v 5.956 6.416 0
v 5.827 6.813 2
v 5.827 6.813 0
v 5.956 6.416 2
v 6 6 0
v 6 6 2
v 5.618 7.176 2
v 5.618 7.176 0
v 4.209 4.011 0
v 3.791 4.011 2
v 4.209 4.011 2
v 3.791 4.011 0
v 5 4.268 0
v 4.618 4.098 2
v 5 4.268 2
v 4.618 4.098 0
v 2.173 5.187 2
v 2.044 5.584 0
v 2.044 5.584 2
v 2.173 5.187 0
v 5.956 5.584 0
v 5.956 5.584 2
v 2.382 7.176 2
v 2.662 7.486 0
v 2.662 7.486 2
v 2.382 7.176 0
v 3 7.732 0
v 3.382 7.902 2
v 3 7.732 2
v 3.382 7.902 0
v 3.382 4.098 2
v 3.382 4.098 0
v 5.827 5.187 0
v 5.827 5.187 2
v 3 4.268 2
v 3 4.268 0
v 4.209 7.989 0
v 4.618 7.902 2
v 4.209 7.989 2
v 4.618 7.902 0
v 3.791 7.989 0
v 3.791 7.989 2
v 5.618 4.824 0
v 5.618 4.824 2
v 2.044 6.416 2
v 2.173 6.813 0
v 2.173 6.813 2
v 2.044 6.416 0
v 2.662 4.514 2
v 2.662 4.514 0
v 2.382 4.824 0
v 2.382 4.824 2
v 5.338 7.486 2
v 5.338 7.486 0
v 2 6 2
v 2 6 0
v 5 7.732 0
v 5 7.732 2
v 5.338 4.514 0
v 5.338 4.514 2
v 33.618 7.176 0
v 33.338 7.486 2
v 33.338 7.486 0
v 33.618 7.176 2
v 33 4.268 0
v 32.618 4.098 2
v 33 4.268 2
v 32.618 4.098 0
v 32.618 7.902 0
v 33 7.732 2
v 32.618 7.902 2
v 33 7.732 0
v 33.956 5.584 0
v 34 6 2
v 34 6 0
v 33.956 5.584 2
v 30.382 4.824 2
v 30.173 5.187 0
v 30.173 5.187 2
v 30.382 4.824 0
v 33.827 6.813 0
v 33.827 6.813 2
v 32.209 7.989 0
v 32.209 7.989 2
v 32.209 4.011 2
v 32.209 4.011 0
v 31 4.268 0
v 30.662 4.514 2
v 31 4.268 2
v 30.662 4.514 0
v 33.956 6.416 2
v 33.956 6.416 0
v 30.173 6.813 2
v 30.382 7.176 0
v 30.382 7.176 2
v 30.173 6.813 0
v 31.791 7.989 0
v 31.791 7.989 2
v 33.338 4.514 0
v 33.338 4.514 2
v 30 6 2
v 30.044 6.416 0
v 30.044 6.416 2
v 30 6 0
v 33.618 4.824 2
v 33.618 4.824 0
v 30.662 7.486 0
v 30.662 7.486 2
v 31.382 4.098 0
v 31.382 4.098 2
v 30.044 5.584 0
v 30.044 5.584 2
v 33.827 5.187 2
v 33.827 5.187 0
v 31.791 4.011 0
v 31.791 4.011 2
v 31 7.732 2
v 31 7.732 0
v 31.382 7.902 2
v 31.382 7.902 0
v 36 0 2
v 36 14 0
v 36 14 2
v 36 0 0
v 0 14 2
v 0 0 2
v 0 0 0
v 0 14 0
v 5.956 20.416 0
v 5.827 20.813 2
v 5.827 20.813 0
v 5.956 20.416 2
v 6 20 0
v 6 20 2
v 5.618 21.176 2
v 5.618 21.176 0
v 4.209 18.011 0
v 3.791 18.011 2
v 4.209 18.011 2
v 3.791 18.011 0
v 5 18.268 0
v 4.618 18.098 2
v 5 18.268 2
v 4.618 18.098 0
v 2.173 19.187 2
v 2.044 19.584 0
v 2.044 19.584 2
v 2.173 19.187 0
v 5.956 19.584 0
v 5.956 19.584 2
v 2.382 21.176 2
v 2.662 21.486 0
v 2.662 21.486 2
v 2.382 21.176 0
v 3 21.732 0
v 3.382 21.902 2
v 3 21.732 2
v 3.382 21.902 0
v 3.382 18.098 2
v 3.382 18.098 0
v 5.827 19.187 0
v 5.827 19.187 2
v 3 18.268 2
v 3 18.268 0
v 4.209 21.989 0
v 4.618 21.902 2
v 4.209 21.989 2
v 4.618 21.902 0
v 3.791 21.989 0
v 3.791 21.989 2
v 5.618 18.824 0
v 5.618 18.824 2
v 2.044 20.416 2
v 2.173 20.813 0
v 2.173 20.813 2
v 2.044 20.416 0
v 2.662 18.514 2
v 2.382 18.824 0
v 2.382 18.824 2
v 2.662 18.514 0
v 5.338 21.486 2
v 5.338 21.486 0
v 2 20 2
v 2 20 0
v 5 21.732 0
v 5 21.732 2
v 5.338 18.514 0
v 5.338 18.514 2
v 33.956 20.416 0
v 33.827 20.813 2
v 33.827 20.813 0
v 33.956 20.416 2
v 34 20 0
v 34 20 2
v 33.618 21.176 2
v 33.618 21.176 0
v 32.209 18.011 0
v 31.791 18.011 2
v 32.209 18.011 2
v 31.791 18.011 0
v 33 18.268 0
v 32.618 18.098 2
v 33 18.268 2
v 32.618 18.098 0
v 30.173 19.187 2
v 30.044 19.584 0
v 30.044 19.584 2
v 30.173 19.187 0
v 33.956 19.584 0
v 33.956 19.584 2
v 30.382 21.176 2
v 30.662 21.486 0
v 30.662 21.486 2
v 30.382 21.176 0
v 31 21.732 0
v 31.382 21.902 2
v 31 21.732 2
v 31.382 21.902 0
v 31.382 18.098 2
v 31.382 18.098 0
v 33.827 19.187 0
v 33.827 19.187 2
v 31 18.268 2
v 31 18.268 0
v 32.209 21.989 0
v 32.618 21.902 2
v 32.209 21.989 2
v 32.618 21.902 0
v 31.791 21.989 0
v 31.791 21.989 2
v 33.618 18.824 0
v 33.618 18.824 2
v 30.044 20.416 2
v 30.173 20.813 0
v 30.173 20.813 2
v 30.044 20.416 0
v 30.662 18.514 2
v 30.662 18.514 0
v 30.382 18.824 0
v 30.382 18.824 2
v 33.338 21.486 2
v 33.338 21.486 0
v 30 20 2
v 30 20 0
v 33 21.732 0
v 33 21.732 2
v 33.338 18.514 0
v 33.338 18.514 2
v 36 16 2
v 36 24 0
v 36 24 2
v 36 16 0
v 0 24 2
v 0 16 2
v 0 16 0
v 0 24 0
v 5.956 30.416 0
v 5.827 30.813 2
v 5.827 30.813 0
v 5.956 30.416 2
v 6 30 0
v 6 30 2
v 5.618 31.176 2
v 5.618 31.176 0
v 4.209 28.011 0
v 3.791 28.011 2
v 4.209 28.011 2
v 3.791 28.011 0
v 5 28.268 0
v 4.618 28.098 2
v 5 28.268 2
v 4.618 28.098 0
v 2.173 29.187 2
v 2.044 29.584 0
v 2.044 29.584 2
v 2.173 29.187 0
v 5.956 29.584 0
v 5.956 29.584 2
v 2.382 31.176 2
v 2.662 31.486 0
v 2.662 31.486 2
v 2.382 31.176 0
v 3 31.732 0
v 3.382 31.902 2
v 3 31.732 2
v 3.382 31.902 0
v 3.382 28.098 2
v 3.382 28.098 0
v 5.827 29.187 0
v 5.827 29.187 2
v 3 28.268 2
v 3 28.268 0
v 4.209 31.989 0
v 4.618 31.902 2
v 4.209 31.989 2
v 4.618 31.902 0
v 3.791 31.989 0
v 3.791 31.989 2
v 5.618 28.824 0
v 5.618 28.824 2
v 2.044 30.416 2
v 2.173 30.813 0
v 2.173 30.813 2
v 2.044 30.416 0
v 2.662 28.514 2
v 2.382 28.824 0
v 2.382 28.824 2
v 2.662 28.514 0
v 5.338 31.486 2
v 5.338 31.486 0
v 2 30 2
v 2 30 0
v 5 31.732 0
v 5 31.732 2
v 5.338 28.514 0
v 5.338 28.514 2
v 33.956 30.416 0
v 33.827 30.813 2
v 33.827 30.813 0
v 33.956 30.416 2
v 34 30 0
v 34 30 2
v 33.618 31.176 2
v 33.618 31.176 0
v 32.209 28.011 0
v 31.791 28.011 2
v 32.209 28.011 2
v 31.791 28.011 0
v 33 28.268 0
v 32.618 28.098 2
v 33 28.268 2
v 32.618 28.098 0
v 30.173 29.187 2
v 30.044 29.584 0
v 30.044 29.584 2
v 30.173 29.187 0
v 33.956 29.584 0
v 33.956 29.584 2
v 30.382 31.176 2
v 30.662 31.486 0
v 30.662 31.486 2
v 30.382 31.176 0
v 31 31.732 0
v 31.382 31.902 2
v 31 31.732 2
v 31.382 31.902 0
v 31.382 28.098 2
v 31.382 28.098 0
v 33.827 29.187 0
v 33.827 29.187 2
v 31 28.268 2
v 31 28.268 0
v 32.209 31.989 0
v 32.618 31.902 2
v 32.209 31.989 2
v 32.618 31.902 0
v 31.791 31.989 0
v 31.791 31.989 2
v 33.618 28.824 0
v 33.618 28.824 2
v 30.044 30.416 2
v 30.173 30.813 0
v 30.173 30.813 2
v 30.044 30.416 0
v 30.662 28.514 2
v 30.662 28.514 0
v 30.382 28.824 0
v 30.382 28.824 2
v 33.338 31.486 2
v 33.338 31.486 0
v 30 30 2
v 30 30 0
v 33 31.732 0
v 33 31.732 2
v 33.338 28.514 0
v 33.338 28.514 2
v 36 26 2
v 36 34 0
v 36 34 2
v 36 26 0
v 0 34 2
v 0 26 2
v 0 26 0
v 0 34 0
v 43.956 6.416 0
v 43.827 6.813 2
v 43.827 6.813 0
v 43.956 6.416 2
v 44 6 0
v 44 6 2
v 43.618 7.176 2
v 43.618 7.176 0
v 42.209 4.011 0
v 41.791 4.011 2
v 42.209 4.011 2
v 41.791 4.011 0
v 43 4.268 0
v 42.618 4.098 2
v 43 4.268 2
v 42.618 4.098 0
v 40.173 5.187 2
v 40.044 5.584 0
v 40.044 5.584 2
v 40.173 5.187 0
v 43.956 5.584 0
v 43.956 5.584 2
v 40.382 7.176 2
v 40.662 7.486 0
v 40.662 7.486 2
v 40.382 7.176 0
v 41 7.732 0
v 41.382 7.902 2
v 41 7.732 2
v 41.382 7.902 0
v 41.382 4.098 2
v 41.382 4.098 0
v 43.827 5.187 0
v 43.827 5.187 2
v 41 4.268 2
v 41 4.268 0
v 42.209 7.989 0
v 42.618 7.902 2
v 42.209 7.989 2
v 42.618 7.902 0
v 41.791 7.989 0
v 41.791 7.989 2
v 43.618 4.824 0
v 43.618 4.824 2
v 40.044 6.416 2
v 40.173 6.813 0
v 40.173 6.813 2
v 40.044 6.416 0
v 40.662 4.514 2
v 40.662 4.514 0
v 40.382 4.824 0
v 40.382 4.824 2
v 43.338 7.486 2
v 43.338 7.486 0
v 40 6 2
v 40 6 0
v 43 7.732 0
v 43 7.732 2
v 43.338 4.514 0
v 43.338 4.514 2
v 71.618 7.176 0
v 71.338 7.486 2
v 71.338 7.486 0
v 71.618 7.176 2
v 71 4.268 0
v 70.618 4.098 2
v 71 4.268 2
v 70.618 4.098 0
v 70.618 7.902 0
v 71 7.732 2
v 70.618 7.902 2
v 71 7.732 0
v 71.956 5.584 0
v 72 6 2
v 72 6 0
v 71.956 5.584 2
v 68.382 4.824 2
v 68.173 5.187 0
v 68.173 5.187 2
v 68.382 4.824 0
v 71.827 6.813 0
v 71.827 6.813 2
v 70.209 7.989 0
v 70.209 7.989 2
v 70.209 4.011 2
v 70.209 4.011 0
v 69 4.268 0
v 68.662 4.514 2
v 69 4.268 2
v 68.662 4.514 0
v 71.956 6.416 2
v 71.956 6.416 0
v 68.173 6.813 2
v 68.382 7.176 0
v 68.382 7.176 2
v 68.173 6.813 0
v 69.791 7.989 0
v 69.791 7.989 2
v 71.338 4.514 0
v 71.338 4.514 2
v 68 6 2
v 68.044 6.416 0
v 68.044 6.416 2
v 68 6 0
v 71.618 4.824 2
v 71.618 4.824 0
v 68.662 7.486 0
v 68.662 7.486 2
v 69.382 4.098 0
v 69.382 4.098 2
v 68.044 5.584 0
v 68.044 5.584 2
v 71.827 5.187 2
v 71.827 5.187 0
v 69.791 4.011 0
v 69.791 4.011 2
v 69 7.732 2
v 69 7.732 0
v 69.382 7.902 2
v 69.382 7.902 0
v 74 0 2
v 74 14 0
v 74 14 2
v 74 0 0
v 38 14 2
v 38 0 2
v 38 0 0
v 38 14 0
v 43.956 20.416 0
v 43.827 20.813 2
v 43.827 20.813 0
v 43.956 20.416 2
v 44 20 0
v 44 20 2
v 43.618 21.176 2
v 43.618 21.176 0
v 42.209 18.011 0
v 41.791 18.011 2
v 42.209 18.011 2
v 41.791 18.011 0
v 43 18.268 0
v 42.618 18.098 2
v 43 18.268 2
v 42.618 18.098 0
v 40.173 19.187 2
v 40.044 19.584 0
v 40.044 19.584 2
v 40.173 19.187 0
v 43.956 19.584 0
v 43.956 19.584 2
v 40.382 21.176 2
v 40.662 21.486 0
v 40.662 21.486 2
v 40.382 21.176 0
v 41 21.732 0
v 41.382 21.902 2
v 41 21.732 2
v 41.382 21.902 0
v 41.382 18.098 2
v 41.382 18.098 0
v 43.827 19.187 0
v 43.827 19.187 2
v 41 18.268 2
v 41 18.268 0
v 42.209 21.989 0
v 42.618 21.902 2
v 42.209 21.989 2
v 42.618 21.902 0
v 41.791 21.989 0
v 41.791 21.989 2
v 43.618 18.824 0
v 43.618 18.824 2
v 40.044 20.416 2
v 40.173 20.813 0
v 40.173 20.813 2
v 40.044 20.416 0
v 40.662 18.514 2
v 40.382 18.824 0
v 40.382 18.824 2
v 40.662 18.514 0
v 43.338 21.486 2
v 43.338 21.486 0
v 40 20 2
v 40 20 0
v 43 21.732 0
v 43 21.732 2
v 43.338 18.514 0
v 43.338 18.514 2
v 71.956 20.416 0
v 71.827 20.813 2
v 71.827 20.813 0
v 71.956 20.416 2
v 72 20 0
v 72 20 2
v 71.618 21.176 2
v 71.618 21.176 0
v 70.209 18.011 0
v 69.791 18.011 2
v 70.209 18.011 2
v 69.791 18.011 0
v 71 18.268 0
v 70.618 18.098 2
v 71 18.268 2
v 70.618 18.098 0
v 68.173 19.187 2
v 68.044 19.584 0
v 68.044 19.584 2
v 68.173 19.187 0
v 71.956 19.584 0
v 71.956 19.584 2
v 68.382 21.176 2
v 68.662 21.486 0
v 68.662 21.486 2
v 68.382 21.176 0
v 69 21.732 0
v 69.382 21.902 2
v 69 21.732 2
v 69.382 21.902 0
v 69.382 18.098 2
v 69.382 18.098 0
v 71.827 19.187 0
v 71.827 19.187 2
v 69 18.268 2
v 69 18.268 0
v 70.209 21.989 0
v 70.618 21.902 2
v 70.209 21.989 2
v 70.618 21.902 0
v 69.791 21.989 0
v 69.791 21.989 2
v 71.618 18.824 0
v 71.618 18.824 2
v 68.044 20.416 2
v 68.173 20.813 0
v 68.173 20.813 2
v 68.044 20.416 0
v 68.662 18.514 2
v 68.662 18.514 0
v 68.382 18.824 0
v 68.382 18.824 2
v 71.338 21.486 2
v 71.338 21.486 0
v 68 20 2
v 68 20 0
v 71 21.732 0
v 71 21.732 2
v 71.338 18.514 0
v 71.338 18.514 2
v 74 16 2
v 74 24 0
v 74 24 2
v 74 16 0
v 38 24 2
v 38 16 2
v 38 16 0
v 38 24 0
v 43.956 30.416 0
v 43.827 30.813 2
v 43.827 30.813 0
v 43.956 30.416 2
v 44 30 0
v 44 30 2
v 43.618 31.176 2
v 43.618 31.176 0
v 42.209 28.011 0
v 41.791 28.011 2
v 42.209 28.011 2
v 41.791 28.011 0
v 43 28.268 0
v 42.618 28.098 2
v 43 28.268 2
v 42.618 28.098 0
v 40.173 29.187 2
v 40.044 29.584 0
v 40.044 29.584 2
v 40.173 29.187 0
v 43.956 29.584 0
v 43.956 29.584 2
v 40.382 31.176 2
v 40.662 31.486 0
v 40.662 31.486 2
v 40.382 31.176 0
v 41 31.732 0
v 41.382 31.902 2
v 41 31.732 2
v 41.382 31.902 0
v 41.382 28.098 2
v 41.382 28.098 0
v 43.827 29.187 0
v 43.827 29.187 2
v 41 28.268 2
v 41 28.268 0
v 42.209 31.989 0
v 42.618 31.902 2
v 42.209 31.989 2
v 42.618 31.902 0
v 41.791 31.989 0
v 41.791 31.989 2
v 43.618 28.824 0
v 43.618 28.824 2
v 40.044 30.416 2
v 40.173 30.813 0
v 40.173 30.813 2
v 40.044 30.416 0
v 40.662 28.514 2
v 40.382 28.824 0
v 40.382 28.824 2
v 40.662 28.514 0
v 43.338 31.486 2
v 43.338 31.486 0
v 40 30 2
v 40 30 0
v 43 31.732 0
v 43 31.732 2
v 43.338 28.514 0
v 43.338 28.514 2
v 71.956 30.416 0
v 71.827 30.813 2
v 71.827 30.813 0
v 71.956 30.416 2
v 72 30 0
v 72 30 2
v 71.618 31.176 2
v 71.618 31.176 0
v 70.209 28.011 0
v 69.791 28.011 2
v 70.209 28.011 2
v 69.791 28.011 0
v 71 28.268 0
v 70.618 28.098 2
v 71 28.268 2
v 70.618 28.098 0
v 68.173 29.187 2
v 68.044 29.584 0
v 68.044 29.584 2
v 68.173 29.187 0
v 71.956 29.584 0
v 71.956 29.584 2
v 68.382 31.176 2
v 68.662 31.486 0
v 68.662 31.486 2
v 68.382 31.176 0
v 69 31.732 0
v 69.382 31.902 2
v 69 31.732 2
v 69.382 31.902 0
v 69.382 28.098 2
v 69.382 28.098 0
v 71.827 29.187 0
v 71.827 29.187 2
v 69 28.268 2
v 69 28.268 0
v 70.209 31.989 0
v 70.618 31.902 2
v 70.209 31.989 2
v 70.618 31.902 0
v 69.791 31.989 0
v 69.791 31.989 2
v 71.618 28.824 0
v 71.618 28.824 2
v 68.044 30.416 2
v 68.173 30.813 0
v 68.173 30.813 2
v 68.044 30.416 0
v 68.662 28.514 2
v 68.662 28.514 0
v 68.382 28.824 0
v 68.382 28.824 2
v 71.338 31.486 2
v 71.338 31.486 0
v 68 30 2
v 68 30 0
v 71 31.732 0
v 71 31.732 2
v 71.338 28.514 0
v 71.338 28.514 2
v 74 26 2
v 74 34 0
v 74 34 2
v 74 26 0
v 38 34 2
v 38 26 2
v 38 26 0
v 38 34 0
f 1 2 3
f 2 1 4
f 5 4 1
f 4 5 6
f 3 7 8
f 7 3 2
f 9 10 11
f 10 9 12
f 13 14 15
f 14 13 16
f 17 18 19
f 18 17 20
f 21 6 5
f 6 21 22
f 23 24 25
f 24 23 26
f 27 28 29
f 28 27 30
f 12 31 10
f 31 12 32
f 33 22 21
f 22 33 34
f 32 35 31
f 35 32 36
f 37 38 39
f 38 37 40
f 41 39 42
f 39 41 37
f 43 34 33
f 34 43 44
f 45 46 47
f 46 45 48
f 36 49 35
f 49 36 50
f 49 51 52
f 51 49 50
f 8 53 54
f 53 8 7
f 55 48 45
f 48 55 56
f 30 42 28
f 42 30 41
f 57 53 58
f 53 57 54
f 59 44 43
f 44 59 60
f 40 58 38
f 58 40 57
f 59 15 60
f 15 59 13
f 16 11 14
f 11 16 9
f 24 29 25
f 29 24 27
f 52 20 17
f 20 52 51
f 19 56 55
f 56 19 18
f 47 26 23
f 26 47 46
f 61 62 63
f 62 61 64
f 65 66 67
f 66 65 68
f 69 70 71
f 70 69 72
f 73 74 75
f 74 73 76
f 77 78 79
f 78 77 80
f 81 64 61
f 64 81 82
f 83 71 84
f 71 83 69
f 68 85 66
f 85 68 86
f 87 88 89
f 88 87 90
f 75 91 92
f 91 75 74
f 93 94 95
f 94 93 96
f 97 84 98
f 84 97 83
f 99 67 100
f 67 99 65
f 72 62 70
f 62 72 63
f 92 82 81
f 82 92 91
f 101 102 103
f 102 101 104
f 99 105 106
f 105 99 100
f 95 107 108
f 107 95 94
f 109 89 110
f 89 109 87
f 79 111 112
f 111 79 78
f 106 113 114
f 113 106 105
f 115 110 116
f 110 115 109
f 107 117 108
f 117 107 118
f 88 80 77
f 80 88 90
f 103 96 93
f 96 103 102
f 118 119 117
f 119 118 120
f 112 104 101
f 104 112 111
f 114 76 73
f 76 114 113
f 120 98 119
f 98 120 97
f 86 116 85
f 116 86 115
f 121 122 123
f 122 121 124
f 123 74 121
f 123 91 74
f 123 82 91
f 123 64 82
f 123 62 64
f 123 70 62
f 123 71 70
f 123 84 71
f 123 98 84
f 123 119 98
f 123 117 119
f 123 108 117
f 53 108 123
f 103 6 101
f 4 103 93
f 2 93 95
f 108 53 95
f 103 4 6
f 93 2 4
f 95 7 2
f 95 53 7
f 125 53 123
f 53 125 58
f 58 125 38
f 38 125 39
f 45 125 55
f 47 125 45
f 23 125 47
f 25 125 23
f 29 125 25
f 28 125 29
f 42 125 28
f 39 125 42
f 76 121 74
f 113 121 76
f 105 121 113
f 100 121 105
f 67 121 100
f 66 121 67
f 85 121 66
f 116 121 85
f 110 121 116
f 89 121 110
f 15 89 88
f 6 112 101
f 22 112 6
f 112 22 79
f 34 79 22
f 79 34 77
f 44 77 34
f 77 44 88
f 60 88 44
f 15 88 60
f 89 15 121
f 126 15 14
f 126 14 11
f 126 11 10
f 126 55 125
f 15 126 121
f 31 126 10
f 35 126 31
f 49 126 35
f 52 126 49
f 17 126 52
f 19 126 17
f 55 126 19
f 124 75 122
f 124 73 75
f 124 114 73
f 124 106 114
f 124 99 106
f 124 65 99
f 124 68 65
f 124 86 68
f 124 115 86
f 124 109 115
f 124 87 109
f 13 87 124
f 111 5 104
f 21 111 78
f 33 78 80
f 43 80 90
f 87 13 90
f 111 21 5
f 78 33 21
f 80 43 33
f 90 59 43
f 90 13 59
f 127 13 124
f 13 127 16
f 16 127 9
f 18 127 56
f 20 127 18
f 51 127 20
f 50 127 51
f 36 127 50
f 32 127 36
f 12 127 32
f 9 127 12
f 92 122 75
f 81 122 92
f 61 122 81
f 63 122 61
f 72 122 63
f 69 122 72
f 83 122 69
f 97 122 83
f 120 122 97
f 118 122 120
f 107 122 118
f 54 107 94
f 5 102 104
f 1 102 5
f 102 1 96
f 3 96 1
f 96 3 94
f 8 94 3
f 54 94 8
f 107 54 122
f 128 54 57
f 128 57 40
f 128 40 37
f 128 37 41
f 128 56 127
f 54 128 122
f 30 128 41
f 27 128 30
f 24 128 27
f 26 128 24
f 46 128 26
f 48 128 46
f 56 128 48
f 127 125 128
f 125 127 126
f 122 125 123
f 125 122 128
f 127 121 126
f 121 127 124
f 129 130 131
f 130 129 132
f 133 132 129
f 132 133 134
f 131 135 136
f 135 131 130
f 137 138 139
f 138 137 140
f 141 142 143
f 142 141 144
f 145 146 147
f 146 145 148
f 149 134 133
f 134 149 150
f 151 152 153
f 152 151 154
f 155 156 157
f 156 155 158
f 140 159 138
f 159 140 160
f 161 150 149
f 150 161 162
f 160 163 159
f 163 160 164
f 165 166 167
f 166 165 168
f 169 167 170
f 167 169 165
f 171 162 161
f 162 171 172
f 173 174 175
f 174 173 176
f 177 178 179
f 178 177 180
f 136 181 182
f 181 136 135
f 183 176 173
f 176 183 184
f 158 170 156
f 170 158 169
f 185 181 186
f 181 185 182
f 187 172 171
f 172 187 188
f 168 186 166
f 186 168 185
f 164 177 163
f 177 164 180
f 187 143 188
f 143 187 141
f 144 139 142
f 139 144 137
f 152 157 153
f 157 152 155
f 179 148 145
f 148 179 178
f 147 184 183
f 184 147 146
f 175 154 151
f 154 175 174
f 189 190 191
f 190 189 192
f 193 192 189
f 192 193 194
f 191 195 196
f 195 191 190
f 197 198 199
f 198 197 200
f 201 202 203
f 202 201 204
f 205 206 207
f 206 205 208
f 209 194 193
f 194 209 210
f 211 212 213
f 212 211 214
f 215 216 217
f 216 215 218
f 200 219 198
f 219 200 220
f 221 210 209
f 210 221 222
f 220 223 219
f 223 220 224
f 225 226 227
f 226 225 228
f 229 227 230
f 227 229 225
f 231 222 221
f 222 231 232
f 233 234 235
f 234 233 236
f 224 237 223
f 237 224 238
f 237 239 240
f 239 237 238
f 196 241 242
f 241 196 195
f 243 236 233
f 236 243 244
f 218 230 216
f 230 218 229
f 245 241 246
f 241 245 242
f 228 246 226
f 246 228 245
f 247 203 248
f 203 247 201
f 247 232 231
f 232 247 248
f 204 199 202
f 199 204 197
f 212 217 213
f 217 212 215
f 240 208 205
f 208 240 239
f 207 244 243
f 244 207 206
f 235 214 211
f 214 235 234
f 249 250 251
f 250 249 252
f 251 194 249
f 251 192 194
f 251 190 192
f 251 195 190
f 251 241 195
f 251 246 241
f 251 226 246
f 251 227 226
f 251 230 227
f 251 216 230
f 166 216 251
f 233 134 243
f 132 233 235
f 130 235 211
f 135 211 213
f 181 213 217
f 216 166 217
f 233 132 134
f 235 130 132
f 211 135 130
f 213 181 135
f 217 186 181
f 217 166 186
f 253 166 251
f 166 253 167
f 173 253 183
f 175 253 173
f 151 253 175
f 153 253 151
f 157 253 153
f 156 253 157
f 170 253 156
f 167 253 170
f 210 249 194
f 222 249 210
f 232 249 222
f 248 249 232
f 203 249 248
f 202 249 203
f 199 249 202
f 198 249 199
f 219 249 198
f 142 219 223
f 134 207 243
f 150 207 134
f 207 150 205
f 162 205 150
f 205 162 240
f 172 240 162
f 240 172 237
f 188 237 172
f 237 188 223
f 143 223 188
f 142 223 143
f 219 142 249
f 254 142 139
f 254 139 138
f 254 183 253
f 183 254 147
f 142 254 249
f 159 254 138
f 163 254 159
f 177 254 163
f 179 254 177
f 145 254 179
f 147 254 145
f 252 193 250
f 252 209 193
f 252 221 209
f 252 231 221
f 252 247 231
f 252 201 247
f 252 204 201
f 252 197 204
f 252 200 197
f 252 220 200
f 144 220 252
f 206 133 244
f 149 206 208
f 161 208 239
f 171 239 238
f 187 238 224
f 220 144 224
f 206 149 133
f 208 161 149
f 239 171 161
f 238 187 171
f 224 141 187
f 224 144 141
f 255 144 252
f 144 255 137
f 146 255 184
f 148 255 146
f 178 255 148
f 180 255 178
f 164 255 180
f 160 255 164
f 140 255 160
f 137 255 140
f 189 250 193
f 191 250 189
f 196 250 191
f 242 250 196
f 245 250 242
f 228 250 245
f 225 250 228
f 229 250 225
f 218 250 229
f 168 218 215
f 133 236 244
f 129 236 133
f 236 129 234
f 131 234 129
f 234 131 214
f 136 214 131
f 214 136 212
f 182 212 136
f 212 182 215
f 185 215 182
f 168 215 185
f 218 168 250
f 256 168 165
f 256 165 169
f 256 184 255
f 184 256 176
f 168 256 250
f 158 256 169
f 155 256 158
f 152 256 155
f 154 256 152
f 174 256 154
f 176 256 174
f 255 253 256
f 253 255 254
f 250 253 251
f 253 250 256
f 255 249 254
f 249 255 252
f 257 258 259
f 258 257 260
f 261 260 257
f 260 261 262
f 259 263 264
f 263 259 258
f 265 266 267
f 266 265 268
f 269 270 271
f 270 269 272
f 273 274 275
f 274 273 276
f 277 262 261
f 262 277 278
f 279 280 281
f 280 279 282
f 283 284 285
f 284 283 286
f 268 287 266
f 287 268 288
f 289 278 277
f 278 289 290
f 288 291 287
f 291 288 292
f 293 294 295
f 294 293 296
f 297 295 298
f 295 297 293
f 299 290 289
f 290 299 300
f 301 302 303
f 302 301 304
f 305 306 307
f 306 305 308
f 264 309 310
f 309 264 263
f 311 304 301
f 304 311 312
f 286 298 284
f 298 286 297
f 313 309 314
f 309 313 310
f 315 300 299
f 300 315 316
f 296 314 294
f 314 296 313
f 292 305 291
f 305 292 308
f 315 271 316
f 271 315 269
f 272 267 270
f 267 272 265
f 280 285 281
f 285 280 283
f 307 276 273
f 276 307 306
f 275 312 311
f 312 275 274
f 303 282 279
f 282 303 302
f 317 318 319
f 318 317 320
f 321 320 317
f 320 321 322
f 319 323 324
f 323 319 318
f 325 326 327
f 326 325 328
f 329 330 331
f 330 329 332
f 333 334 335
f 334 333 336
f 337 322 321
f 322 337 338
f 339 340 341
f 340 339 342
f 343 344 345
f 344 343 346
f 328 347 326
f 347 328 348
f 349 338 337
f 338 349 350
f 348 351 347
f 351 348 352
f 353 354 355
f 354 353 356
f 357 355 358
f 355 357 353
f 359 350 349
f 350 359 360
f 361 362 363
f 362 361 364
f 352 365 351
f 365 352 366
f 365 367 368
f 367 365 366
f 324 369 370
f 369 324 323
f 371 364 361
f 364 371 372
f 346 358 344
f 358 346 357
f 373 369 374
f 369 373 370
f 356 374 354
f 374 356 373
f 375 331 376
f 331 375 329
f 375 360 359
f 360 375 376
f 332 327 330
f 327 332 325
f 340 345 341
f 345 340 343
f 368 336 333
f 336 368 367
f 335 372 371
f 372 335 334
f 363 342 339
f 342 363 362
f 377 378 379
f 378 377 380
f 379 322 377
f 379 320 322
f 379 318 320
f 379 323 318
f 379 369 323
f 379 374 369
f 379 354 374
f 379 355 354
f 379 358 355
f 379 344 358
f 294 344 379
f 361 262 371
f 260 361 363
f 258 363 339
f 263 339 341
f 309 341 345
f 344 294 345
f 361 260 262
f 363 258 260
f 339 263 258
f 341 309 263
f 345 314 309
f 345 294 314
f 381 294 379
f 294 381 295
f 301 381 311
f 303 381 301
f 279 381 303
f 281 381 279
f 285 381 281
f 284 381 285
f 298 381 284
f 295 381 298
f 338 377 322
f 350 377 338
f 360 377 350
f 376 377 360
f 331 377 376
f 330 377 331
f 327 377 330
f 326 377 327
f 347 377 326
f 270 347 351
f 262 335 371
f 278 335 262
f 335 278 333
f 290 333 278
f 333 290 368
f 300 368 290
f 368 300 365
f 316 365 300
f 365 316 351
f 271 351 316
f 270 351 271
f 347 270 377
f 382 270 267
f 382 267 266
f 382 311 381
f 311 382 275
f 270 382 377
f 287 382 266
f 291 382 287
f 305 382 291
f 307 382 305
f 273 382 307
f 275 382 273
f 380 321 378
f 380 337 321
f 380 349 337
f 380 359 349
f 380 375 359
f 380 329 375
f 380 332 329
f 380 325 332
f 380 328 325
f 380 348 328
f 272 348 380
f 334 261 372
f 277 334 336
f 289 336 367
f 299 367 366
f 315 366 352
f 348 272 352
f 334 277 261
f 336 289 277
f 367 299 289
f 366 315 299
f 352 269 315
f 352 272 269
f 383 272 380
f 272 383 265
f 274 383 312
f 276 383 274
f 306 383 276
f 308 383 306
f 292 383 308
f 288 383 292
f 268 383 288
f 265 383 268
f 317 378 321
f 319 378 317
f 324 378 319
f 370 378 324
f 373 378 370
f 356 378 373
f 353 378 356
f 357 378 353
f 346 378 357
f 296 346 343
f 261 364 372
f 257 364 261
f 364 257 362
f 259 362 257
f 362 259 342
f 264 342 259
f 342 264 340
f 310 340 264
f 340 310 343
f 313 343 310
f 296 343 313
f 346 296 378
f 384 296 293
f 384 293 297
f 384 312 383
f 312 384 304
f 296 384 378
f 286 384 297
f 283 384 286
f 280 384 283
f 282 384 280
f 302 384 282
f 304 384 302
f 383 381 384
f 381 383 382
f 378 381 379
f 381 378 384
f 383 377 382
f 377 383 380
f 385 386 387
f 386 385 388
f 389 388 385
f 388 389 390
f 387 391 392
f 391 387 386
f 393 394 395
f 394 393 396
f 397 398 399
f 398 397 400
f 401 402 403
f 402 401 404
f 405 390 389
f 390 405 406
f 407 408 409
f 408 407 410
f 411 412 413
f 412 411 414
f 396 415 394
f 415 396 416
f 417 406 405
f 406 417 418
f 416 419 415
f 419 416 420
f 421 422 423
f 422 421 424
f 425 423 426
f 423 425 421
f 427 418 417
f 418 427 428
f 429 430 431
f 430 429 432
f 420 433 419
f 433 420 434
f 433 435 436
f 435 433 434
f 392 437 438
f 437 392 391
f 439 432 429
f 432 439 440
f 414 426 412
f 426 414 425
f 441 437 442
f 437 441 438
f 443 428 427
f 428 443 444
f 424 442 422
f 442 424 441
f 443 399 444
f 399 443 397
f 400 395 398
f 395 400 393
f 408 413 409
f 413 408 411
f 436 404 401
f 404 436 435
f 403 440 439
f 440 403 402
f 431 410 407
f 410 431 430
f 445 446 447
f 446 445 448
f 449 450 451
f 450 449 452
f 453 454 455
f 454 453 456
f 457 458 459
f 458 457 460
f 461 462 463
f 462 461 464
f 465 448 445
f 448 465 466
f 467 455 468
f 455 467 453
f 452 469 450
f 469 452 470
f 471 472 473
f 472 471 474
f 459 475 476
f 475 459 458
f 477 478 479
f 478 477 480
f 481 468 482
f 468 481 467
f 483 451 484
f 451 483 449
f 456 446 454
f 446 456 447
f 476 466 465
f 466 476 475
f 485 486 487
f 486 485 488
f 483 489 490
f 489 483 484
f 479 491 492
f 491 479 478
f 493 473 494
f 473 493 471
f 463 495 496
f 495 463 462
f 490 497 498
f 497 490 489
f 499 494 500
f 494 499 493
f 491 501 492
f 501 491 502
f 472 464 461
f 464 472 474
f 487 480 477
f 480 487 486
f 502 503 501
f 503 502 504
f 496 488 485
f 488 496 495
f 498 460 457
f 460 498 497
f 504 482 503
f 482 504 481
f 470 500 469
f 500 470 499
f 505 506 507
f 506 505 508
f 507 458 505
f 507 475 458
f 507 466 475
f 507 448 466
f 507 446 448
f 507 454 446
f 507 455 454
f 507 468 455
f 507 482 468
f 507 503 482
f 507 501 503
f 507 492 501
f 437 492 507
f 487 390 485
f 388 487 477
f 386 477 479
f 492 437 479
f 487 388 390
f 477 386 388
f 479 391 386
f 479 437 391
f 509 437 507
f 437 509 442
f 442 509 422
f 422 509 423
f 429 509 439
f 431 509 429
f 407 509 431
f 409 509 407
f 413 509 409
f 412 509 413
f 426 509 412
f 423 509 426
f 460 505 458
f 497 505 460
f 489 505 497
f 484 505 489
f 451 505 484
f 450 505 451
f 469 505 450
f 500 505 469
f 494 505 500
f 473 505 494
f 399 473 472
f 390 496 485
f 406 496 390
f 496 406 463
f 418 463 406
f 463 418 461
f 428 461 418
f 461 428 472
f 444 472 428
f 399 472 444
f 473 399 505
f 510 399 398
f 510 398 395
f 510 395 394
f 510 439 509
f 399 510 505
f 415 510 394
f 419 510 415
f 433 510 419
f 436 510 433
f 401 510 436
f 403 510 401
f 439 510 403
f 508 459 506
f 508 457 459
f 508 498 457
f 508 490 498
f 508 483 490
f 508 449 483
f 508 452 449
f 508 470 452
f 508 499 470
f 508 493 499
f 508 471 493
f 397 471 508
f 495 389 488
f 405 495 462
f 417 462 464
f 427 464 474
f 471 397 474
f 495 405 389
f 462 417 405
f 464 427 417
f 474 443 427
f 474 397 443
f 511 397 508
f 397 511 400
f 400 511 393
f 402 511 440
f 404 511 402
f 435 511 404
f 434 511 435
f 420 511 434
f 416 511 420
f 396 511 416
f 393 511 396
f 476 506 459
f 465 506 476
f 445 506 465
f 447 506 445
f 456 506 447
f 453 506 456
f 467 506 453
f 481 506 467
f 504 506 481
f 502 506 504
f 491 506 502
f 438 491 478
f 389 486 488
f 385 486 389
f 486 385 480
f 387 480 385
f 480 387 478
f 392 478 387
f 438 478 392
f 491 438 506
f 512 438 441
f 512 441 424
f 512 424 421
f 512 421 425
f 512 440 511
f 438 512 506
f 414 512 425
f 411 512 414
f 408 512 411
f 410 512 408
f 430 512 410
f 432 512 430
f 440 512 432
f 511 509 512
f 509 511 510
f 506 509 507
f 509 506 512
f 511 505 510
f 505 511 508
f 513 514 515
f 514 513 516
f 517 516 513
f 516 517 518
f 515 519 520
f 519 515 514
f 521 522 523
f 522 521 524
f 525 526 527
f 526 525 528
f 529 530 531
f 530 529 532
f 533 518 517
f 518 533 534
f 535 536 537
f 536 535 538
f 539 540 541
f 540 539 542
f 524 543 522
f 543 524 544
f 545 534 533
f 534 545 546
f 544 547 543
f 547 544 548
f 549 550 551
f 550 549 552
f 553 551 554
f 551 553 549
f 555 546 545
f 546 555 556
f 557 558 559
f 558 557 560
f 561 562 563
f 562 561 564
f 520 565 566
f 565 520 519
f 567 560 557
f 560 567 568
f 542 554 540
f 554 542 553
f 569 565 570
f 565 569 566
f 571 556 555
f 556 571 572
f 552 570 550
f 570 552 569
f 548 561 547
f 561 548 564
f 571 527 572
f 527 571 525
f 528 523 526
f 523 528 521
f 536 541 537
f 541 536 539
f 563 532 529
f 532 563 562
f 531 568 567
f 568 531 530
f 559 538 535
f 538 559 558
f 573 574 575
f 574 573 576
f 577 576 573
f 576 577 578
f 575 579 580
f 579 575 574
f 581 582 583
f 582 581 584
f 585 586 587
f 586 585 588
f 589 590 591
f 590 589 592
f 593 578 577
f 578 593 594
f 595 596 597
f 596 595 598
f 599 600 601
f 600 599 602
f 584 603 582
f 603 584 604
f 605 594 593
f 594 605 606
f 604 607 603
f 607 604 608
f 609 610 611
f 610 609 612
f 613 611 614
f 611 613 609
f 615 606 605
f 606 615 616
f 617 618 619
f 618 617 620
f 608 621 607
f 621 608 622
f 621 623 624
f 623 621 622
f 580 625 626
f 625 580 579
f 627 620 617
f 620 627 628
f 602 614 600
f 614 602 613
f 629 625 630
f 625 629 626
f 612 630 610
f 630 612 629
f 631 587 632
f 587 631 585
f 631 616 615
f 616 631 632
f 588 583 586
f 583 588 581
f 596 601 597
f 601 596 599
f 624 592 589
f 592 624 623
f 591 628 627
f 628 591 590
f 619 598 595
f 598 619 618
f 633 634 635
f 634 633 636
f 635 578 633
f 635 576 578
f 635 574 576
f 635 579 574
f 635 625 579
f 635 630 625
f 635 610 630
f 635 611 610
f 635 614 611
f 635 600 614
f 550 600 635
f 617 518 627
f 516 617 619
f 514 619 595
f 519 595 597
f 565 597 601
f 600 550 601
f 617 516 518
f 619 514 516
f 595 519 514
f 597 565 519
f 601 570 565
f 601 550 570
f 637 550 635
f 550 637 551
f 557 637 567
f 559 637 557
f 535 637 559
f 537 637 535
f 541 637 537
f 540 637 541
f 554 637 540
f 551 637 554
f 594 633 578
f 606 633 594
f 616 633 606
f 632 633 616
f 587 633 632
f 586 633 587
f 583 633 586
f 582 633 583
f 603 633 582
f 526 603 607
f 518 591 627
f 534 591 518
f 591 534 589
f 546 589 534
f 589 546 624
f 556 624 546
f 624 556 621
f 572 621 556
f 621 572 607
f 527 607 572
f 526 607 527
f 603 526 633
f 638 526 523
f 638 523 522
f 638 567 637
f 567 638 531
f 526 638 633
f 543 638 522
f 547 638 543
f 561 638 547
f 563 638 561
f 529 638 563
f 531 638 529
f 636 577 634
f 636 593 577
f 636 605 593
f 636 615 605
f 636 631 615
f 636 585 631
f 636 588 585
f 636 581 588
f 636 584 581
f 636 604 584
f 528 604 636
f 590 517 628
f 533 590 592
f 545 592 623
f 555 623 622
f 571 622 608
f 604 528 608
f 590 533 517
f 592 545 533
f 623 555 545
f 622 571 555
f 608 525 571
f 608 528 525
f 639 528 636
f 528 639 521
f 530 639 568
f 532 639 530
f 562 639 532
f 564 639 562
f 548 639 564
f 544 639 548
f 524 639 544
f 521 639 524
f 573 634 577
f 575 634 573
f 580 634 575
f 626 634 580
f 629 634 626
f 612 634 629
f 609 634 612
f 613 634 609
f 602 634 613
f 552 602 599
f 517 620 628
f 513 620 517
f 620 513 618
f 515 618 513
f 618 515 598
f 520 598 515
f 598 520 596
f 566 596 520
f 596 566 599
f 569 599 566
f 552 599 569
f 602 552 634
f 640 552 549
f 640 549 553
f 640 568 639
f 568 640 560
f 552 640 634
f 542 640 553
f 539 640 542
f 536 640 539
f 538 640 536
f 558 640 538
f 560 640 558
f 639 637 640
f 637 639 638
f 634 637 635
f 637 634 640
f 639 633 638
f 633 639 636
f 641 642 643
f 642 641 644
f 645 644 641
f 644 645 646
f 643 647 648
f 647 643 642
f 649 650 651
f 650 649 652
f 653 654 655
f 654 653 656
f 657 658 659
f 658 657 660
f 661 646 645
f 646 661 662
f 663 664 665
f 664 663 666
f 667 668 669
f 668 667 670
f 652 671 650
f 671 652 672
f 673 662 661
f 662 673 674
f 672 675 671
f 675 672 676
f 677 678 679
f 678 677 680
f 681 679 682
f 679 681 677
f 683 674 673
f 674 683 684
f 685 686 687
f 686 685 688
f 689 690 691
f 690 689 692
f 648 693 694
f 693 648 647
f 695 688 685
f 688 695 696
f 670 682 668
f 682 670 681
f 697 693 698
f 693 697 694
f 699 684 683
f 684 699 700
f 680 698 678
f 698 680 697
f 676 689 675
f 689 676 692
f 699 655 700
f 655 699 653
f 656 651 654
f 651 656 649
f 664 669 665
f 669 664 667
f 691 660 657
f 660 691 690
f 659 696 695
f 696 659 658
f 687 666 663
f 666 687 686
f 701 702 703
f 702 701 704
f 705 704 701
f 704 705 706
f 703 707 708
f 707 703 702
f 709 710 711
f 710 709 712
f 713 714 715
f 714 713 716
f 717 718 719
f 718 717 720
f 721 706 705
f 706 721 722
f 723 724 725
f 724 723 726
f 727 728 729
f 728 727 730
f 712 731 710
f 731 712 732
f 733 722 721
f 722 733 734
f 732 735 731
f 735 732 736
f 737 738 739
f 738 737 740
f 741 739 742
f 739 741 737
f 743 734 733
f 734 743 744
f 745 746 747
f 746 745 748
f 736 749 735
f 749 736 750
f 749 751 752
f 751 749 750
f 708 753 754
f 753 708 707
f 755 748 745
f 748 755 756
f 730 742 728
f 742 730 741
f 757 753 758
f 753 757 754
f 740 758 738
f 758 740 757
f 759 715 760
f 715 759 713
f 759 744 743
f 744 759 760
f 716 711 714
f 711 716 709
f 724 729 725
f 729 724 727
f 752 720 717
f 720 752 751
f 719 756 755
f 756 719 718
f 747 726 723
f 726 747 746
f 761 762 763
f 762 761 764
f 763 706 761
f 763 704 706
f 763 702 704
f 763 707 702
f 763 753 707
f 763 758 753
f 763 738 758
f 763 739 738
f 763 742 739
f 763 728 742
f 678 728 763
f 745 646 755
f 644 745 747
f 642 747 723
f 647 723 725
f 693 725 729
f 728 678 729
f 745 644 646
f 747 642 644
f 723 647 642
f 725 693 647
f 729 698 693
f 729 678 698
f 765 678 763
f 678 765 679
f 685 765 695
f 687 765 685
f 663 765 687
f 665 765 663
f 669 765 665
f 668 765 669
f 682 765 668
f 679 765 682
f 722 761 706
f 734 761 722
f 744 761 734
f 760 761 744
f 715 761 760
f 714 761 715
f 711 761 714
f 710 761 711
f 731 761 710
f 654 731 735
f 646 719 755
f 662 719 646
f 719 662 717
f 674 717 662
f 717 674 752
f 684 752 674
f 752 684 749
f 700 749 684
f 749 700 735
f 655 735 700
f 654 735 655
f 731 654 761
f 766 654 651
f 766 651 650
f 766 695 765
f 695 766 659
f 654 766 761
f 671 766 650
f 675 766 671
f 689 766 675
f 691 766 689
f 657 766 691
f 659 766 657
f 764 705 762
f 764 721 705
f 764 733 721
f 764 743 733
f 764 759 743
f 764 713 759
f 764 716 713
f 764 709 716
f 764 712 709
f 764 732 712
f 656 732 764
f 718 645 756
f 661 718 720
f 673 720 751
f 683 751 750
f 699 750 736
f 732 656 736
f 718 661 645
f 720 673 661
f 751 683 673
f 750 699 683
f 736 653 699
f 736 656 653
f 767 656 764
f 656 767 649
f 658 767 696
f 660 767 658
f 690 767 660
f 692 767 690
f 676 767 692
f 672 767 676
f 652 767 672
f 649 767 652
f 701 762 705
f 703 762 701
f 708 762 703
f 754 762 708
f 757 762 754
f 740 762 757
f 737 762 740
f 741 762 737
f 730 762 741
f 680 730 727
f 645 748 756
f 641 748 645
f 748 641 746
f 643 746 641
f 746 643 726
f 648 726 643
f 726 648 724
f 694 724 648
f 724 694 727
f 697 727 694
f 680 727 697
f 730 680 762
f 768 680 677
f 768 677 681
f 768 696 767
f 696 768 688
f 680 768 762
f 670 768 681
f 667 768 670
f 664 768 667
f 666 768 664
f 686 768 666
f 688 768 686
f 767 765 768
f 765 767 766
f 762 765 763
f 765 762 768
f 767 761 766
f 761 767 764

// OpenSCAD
count=2;

s = 3;              // spacing
w = 18+2*(4+2+s);   // width

module distancingElement()
{
  difference()
  {
    cube([w, 8+6, 2]);
    for(dx = [2+4/2, w-(2+4/2)])
      translate([dx, 8/2+4/2, -1])
        cylinder(r=4/2, h=4, $fs=0.1);
  }
}

module clamp()
{
  difference()
  {
    cube([w, 4+2*2, 2]);
    for(dx = [2+4/2, w-(2+4/2)])
      translate([dx, 8/2, -1])
        cylinder(r=4/2, h=4, $fs=0.1);
  }
}


for(i = [0:count-1])
  translate([i*38,0,0])
    {
      distancingElement();
      for(dy = [0, 10])
        translate([0, 16+dy, 0])
          clamp();
    }
